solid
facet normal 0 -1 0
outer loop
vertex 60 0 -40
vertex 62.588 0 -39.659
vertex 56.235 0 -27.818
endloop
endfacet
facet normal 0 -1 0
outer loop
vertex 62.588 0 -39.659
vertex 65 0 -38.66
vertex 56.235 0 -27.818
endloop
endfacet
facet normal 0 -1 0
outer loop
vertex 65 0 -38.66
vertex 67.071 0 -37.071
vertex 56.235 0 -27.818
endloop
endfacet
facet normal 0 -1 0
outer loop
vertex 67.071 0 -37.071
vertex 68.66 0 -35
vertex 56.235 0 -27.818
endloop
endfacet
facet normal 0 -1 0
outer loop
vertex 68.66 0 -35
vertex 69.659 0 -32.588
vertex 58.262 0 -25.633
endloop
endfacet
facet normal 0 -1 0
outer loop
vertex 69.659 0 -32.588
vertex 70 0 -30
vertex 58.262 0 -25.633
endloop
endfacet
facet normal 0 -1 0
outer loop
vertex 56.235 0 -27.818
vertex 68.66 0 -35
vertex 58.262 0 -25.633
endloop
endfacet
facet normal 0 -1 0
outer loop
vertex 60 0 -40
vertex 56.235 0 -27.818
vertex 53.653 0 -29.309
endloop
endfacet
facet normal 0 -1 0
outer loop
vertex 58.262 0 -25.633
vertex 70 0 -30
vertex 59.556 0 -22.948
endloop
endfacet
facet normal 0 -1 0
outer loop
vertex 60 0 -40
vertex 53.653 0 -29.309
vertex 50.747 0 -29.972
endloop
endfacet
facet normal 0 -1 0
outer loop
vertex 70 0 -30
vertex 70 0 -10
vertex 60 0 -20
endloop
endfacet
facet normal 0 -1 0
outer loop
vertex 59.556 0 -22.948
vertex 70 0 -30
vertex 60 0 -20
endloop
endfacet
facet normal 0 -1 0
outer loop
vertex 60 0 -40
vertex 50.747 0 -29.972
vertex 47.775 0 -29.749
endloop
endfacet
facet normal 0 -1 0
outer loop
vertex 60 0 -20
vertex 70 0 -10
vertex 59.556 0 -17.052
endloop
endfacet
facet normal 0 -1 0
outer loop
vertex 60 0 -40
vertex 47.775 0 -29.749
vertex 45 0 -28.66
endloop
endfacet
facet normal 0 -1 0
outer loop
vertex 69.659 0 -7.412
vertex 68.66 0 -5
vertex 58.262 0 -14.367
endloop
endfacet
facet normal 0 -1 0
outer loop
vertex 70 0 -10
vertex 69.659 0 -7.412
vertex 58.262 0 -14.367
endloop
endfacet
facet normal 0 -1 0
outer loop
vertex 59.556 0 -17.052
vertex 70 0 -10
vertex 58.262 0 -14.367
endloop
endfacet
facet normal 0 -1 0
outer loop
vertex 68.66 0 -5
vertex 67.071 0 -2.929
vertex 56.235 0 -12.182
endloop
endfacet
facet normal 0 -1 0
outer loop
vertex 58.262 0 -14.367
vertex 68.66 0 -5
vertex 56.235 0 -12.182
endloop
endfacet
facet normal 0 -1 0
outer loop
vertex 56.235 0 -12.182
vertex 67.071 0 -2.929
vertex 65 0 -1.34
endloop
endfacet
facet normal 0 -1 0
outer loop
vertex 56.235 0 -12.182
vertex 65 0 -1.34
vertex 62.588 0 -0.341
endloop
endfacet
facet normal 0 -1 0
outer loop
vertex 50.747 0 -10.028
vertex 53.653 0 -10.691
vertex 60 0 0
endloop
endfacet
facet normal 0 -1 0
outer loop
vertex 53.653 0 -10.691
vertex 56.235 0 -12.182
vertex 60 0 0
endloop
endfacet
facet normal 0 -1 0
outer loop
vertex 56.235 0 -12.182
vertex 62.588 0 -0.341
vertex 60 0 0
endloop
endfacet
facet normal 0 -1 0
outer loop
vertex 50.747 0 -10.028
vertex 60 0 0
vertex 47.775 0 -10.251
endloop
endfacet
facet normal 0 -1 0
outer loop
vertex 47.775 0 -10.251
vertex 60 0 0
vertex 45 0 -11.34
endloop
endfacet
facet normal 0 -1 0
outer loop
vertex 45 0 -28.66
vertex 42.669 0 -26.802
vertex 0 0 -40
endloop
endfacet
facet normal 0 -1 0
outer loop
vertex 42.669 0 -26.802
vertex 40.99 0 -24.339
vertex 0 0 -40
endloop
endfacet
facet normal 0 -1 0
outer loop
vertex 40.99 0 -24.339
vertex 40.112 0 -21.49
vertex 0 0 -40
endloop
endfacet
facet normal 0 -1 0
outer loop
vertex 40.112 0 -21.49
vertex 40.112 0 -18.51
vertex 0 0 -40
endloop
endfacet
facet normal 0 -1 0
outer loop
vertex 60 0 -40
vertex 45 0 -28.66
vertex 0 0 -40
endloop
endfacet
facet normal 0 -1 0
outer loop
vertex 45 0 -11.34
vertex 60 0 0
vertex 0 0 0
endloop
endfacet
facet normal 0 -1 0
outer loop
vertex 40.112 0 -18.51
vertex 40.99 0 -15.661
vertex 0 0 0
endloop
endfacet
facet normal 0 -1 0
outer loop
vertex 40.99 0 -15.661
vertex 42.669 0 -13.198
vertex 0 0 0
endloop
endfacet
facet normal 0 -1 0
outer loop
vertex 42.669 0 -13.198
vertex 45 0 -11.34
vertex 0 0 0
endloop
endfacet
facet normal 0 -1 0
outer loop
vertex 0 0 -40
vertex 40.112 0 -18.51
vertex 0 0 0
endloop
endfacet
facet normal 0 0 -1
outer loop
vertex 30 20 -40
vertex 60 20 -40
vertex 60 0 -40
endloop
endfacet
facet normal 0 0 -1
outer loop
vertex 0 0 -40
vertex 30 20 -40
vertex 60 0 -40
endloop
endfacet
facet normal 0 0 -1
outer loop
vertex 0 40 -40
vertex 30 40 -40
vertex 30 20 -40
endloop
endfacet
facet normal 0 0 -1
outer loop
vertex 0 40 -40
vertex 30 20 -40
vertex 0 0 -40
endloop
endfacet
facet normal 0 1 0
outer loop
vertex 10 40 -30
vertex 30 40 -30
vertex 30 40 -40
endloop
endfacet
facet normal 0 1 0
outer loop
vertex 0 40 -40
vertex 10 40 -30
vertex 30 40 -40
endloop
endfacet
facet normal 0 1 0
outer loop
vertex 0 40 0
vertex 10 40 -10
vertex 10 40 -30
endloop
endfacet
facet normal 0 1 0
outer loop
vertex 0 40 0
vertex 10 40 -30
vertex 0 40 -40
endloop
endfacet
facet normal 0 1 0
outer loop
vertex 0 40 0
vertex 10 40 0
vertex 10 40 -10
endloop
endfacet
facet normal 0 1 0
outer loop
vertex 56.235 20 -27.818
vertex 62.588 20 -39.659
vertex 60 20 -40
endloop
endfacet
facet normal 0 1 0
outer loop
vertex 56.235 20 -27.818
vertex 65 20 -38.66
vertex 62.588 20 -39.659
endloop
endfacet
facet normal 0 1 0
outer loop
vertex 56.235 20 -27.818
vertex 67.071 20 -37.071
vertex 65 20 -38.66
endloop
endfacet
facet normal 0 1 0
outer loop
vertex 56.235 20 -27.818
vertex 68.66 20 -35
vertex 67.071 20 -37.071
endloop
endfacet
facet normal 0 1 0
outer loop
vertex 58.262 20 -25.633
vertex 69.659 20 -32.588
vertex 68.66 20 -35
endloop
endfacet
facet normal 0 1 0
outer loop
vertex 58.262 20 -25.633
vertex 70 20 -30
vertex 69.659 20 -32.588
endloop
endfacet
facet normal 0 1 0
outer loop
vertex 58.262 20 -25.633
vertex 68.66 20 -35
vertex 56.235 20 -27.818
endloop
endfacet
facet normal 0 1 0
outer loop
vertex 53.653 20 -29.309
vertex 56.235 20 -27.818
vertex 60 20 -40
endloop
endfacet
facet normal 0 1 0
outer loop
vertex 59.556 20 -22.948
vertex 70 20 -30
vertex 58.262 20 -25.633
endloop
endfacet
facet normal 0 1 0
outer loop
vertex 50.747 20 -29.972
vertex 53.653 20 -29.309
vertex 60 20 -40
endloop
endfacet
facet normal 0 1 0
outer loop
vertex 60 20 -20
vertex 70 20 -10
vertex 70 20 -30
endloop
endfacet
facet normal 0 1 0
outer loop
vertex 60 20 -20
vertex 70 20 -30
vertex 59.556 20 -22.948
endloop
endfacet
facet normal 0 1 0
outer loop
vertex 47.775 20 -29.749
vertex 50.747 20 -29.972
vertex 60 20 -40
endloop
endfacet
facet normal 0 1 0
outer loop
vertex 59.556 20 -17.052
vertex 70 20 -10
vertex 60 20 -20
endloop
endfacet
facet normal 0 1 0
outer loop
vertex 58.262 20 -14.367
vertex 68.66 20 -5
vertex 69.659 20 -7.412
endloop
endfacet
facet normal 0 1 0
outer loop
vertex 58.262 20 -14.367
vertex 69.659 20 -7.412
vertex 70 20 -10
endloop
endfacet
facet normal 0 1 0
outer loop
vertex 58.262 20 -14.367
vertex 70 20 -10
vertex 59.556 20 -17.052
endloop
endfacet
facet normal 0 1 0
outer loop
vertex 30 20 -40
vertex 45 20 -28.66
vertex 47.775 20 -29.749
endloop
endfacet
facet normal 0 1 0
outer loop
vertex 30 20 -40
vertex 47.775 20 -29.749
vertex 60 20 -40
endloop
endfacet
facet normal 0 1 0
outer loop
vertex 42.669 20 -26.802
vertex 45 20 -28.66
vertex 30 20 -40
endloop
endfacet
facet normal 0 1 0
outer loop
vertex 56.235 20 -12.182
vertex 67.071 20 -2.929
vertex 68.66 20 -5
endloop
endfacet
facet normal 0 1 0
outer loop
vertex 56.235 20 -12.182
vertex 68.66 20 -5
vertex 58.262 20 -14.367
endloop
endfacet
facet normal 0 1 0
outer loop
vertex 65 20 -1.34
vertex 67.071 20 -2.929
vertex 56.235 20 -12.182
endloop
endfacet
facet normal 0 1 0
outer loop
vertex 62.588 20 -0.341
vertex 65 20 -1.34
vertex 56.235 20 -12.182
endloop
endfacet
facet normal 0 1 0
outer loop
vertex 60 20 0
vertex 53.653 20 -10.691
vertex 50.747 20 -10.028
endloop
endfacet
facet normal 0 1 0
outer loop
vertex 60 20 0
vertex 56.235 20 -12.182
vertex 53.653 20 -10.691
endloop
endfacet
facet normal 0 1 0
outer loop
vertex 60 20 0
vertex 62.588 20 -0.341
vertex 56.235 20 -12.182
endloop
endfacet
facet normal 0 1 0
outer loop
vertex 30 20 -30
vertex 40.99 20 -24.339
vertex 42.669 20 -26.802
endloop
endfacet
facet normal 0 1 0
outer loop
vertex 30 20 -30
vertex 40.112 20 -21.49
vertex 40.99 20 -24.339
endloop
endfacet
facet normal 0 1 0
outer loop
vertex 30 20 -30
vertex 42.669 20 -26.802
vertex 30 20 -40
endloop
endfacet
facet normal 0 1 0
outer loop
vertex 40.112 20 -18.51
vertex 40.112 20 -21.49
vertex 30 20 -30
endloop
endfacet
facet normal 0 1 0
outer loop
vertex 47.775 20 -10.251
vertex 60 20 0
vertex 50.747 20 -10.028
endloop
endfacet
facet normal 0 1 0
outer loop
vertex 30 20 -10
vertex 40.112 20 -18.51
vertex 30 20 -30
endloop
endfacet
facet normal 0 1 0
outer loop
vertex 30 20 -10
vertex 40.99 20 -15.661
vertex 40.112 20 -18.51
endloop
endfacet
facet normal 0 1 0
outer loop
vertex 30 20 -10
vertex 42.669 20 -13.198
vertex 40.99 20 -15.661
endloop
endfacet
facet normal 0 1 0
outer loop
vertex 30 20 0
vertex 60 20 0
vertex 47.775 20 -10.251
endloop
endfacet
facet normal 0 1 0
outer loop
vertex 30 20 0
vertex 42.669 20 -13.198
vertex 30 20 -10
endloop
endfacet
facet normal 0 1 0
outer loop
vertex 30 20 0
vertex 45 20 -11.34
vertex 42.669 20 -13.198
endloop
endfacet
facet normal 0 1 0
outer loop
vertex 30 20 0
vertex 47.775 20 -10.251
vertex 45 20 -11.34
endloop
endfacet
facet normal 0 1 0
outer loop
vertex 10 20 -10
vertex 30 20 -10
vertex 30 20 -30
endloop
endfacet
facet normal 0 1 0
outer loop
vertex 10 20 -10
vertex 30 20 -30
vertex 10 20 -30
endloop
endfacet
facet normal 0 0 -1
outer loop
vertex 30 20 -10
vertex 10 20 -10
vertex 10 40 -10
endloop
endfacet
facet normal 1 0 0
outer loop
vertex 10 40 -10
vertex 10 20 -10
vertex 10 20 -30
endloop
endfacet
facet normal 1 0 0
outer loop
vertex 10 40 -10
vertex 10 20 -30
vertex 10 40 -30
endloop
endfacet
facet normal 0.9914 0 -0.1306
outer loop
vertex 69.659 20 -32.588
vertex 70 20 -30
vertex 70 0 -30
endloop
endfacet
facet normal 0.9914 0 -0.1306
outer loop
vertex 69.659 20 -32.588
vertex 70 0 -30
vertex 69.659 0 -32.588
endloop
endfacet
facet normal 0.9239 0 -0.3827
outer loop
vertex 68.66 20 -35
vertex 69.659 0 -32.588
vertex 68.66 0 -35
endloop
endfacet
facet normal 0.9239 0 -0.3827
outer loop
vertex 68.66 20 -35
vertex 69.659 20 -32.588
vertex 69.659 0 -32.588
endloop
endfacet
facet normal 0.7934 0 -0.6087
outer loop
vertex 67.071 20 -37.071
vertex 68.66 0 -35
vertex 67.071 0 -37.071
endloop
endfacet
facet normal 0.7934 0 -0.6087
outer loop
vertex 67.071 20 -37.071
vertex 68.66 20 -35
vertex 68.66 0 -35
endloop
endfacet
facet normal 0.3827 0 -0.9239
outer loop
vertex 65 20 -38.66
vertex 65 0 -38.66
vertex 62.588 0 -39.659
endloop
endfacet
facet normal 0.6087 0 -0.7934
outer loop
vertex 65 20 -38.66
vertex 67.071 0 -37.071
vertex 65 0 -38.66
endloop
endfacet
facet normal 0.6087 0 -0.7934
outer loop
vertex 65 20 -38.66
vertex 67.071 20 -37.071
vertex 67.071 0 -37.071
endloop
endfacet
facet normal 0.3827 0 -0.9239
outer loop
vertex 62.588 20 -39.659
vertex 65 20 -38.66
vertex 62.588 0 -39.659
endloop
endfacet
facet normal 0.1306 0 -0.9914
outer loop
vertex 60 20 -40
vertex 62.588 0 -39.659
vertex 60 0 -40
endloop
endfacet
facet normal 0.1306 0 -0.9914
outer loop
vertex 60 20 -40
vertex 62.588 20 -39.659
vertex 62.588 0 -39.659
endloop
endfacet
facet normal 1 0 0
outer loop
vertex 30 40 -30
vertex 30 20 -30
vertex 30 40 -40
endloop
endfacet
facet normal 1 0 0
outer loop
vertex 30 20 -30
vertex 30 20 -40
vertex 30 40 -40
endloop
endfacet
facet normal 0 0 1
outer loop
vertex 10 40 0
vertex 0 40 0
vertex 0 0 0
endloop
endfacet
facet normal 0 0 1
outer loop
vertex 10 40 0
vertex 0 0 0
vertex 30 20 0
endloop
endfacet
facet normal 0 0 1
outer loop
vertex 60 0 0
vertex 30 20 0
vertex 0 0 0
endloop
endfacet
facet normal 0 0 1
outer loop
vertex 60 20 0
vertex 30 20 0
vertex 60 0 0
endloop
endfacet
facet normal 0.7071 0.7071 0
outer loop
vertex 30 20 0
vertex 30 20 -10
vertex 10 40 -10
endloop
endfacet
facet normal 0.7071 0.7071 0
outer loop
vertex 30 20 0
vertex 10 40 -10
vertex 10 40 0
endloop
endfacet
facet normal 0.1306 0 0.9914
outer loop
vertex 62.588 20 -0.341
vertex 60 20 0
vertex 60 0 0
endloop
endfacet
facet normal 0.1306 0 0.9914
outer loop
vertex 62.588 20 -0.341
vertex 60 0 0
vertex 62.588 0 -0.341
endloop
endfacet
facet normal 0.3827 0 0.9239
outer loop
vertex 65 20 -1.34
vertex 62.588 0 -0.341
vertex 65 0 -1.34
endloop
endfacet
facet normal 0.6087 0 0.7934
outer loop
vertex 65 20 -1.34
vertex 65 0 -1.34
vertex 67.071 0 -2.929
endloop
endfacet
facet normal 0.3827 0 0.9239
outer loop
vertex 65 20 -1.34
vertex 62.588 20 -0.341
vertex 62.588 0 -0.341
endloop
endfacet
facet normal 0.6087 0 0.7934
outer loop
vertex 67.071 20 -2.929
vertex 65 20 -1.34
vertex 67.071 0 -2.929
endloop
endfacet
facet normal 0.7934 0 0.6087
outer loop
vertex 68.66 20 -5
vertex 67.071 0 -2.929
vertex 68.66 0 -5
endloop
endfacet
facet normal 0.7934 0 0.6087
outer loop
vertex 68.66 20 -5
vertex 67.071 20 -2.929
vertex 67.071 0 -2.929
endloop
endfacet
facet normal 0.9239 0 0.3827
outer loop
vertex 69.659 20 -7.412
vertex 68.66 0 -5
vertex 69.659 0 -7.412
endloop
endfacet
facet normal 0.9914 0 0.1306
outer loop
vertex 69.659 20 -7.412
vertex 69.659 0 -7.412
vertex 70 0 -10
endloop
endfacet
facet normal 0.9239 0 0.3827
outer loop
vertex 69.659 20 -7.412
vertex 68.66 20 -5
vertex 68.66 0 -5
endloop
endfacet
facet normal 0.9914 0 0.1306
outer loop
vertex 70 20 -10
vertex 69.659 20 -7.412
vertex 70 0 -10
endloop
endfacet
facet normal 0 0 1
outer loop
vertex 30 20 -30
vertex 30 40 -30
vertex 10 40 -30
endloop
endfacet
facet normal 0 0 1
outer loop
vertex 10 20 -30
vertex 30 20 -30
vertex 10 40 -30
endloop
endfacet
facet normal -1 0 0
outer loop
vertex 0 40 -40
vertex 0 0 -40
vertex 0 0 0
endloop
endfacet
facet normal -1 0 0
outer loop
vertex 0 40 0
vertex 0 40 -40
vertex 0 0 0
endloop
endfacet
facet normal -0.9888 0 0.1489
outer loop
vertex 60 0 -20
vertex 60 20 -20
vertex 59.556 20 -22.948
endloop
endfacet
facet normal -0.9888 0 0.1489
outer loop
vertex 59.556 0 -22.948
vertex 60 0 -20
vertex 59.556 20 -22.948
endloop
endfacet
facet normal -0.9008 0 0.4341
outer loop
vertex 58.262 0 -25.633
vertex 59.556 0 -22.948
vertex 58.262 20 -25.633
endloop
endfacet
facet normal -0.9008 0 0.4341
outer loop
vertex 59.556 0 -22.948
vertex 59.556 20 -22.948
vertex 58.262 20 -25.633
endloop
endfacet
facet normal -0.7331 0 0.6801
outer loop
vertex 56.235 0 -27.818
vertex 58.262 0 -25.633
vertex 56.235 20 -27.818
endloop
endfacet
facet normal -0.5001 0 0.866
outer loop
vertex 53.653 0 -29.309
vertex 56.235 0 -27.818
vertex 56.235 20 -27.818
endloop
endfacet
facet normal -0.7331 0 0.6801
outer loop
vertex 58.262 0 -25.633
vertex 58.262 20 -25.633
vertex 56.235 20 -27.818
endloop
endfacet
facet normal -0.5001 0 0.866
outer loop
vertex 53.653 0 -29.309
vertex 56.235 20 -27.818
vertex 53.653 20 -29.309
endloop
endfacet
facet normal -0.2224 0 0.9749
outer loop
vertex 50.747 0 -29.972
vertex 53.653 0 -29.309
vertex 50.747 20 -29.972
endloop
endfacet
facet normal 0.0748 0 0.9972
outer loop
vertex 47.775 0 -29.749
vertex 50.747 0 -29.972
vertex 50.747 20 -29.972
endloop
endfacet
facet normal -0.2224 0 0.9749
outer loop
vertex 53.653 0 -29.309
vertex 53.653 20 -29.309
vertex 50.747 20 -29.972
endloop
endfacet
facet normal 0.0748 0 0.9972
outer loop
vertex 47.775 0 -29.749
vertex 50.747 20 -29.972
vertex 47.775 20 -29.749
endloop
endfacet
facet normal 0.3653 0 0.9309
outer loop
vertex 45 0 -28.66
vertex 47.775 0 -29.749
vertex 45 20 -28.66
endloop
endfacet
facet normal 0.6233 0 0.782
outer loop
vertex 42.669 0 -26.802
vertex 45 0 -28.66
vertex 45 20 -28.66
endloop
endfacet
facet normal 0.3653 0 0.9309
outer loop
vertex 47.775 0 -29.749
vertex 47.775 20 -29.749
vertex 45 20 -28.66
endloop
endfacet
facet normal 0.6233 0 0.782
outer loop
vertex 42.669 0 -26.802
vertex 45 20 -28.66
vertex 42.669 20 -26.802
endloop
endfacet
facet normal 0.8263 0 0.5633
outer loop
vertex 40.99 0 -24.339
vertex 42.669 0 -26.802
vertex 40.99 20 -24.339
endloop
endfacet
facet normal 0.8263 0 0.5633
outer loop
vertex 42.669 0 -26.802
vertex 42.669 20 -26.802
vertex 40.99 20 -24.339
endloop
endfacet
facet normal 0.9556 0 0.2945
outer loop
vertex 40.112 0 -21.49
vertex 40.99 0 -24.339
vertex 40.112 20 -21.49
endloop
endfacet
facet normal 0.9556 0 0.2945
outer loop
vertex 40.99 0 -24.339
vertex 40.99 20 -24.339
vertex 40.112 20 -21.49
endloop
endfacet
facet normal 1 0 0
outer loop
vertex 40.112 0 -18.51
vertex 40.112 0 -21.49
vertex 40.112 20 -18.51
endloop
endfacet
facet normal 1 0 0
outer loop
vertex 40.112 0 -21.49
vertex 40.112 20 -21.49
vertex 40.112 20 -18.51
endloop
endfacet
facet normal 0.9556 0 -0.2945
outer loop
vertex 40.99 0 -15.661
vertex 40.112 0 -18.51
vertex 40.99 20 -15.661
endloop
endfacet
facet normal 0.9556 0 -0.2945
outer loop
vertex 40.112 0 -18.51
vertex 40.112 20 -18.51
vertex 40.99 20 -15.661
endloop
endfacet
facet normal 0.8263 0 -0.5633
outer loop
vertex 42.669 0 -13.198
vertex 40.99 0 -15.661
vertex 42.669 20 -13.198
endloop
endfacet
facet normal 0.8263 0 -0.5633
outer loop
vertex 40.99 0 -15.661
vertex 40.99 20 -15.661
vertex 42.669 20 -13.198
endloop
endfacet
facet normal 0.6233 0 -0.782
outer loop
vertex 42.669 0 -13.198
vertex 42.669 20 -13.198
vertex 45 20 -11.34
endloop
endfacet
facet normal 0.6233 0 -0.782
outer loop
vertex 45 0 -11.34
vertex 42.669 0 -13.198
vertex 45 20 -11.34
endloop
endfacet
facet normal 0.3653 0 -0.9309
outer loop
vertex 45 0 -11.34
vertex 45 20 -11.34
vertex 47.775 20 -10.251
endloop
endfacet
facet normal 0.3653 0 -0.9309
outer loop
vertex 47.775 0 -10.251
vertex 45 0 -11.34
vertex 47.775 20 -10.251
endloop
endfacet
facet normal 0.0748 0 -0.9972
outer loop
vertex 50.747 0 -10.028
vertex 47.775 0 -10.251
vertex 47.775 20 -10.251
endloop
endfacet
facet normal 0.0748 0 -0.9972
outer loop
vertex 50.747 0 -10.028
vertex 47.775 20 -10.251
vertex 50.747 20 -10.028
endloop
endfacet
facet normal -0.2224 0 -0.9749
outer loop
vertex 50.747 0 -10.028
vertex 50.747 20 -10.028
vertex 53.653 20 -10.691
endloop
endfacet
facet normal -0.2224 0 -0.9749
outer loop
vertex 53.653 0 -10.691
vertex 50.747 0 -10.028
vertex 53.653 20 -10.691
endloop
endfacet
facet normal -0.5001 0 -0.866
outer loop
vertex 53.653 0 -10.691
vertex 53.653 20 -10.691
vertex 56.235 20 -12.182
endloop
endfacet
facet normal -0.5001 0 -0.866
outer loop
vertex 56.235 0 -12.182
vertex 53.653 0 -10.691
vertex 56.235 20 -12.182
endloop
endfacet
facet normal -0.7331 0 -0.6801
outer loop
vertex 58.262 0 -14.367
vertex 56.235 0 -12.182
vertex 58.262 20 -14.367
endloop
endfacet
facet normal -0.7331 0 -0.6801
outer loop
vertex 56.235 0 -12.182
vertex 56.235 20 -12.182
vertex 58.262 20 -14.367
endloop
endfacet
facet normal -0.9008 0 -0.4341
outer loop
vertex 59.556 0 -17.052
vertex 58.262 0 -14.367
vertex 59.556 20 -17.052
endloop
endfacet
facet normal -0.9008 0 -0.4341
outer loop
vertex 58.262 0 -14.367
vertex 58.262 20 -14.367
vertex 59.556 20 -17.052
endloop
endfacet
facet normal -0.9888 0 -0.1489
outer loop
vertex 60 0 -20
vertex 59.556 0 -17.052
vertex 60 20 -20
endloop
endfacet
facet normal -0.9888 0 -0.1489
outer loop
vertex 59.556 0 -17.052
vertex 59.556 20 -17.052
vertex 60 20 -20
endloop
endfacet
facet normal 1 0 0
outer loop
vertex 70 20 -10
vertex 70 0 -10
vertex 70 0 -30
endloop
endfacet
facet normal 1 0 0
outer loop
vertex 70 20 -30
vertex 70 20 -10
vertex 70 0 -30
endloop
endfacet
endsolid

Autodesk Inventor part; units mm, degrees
ref_plane "YZ Plane" through (0, 0, 0) normal (1, 0, 0) x (0, 1, 0)
ref_plane "XZ Plane" through (0, 0, 0) normal (0, 1, 0) x (-1, 0, 0)
ref_plane "XY Plane" through (0, 0, 0) normal (0, 0, 1) x (1, 0, 0)
sketch "草圖1" plane through (0, 0, 0) normal (0, 1, 0) x (-1, 0, 0)
  line L0 (0, 0) -> (-70, 0)
  line L1 (-70, 0) -> (-70, -40)
  line L2 (-70, -40) -> (0, -40)
  line L3 (0, -40) -> (0, 0)
  dimension "d0" = 40
  dimension "d1" = 70
extrude "擠出1" add sketch "草圖1" along normal blind 20
sketch "草圖2" plane through (0, 0, 0) normal (0, 0, 1) x (1, 0, 0)
  line L0 (0, 20) -> (70, 20) projected
  line L1 (0, 20) -> (10, 20)
  line L2 (10, 20) -> (10, 40)
  line L3 (10, 40) -> (0, 40)
  line L4 (0, 40) -> (0, 20)
  point P0 (0, 0)
  dimension "d4" = 10
  dimension "d5" = 20
extrude "擠出2" add sketch "草圖2" against normal up to surface (40 mm away)
sketch "草圖3" plane through (70, 0, -40) normal (0, 0, -1) x (-1, 0, 0)
  line L0 (60, 20) -> (60, 40) projected
  line L1 (60, 20) -> (40, 20)
  line L2 (40, 20) -> (40, 40)
  line L3 (40, 40) -> (60, 40)
  line L4 (60, 40) -> (60, 20)
  point P0 (70, 0)
  dimension "d8" = 20
  dimension "d9" = 20
extrude "擠出3" add sketch "草圖3" against normal blind 10
sketch "草圖4" plane through (0, 0, 0) normal (0, 0, 1) x (1, 0, 0)
  line L0 (30, 20) -> (10, 20) projected
  line L1 (30, 20) -> (30, 40) projected
  line L2 (30, 40) -> (10, 40) projected
  line L3 (10, 20) -> (10, 40) projected
  point P0 (0, 0)
extrude "擠出4" add sketch "草圖4" against normal blind 10
chamfer "倒角1" distance 20 angle 45 1 edges at (30, 40, -5)
fillet "圓角1" radius 10 2 edges at (70, 10, 0) (70, 10, -40)
sketch "草圖5" plane through (0, 20, 0) normal (0, 1, 0) x (1, 0, 0)
  circle A0 centre (50, 20) radius 10
  line L0 (30, 0) -> (60, 0) projected
  line L1 (70, 10) -> (70, 30) projected
  point P0 (0, 0)
  dimension "d18" = 20
  dimension "d19" = 20
  dimension "d20" = 20
extrude "擠出5" cut sketch "草圖5" against normal through all
properties part number "2"
